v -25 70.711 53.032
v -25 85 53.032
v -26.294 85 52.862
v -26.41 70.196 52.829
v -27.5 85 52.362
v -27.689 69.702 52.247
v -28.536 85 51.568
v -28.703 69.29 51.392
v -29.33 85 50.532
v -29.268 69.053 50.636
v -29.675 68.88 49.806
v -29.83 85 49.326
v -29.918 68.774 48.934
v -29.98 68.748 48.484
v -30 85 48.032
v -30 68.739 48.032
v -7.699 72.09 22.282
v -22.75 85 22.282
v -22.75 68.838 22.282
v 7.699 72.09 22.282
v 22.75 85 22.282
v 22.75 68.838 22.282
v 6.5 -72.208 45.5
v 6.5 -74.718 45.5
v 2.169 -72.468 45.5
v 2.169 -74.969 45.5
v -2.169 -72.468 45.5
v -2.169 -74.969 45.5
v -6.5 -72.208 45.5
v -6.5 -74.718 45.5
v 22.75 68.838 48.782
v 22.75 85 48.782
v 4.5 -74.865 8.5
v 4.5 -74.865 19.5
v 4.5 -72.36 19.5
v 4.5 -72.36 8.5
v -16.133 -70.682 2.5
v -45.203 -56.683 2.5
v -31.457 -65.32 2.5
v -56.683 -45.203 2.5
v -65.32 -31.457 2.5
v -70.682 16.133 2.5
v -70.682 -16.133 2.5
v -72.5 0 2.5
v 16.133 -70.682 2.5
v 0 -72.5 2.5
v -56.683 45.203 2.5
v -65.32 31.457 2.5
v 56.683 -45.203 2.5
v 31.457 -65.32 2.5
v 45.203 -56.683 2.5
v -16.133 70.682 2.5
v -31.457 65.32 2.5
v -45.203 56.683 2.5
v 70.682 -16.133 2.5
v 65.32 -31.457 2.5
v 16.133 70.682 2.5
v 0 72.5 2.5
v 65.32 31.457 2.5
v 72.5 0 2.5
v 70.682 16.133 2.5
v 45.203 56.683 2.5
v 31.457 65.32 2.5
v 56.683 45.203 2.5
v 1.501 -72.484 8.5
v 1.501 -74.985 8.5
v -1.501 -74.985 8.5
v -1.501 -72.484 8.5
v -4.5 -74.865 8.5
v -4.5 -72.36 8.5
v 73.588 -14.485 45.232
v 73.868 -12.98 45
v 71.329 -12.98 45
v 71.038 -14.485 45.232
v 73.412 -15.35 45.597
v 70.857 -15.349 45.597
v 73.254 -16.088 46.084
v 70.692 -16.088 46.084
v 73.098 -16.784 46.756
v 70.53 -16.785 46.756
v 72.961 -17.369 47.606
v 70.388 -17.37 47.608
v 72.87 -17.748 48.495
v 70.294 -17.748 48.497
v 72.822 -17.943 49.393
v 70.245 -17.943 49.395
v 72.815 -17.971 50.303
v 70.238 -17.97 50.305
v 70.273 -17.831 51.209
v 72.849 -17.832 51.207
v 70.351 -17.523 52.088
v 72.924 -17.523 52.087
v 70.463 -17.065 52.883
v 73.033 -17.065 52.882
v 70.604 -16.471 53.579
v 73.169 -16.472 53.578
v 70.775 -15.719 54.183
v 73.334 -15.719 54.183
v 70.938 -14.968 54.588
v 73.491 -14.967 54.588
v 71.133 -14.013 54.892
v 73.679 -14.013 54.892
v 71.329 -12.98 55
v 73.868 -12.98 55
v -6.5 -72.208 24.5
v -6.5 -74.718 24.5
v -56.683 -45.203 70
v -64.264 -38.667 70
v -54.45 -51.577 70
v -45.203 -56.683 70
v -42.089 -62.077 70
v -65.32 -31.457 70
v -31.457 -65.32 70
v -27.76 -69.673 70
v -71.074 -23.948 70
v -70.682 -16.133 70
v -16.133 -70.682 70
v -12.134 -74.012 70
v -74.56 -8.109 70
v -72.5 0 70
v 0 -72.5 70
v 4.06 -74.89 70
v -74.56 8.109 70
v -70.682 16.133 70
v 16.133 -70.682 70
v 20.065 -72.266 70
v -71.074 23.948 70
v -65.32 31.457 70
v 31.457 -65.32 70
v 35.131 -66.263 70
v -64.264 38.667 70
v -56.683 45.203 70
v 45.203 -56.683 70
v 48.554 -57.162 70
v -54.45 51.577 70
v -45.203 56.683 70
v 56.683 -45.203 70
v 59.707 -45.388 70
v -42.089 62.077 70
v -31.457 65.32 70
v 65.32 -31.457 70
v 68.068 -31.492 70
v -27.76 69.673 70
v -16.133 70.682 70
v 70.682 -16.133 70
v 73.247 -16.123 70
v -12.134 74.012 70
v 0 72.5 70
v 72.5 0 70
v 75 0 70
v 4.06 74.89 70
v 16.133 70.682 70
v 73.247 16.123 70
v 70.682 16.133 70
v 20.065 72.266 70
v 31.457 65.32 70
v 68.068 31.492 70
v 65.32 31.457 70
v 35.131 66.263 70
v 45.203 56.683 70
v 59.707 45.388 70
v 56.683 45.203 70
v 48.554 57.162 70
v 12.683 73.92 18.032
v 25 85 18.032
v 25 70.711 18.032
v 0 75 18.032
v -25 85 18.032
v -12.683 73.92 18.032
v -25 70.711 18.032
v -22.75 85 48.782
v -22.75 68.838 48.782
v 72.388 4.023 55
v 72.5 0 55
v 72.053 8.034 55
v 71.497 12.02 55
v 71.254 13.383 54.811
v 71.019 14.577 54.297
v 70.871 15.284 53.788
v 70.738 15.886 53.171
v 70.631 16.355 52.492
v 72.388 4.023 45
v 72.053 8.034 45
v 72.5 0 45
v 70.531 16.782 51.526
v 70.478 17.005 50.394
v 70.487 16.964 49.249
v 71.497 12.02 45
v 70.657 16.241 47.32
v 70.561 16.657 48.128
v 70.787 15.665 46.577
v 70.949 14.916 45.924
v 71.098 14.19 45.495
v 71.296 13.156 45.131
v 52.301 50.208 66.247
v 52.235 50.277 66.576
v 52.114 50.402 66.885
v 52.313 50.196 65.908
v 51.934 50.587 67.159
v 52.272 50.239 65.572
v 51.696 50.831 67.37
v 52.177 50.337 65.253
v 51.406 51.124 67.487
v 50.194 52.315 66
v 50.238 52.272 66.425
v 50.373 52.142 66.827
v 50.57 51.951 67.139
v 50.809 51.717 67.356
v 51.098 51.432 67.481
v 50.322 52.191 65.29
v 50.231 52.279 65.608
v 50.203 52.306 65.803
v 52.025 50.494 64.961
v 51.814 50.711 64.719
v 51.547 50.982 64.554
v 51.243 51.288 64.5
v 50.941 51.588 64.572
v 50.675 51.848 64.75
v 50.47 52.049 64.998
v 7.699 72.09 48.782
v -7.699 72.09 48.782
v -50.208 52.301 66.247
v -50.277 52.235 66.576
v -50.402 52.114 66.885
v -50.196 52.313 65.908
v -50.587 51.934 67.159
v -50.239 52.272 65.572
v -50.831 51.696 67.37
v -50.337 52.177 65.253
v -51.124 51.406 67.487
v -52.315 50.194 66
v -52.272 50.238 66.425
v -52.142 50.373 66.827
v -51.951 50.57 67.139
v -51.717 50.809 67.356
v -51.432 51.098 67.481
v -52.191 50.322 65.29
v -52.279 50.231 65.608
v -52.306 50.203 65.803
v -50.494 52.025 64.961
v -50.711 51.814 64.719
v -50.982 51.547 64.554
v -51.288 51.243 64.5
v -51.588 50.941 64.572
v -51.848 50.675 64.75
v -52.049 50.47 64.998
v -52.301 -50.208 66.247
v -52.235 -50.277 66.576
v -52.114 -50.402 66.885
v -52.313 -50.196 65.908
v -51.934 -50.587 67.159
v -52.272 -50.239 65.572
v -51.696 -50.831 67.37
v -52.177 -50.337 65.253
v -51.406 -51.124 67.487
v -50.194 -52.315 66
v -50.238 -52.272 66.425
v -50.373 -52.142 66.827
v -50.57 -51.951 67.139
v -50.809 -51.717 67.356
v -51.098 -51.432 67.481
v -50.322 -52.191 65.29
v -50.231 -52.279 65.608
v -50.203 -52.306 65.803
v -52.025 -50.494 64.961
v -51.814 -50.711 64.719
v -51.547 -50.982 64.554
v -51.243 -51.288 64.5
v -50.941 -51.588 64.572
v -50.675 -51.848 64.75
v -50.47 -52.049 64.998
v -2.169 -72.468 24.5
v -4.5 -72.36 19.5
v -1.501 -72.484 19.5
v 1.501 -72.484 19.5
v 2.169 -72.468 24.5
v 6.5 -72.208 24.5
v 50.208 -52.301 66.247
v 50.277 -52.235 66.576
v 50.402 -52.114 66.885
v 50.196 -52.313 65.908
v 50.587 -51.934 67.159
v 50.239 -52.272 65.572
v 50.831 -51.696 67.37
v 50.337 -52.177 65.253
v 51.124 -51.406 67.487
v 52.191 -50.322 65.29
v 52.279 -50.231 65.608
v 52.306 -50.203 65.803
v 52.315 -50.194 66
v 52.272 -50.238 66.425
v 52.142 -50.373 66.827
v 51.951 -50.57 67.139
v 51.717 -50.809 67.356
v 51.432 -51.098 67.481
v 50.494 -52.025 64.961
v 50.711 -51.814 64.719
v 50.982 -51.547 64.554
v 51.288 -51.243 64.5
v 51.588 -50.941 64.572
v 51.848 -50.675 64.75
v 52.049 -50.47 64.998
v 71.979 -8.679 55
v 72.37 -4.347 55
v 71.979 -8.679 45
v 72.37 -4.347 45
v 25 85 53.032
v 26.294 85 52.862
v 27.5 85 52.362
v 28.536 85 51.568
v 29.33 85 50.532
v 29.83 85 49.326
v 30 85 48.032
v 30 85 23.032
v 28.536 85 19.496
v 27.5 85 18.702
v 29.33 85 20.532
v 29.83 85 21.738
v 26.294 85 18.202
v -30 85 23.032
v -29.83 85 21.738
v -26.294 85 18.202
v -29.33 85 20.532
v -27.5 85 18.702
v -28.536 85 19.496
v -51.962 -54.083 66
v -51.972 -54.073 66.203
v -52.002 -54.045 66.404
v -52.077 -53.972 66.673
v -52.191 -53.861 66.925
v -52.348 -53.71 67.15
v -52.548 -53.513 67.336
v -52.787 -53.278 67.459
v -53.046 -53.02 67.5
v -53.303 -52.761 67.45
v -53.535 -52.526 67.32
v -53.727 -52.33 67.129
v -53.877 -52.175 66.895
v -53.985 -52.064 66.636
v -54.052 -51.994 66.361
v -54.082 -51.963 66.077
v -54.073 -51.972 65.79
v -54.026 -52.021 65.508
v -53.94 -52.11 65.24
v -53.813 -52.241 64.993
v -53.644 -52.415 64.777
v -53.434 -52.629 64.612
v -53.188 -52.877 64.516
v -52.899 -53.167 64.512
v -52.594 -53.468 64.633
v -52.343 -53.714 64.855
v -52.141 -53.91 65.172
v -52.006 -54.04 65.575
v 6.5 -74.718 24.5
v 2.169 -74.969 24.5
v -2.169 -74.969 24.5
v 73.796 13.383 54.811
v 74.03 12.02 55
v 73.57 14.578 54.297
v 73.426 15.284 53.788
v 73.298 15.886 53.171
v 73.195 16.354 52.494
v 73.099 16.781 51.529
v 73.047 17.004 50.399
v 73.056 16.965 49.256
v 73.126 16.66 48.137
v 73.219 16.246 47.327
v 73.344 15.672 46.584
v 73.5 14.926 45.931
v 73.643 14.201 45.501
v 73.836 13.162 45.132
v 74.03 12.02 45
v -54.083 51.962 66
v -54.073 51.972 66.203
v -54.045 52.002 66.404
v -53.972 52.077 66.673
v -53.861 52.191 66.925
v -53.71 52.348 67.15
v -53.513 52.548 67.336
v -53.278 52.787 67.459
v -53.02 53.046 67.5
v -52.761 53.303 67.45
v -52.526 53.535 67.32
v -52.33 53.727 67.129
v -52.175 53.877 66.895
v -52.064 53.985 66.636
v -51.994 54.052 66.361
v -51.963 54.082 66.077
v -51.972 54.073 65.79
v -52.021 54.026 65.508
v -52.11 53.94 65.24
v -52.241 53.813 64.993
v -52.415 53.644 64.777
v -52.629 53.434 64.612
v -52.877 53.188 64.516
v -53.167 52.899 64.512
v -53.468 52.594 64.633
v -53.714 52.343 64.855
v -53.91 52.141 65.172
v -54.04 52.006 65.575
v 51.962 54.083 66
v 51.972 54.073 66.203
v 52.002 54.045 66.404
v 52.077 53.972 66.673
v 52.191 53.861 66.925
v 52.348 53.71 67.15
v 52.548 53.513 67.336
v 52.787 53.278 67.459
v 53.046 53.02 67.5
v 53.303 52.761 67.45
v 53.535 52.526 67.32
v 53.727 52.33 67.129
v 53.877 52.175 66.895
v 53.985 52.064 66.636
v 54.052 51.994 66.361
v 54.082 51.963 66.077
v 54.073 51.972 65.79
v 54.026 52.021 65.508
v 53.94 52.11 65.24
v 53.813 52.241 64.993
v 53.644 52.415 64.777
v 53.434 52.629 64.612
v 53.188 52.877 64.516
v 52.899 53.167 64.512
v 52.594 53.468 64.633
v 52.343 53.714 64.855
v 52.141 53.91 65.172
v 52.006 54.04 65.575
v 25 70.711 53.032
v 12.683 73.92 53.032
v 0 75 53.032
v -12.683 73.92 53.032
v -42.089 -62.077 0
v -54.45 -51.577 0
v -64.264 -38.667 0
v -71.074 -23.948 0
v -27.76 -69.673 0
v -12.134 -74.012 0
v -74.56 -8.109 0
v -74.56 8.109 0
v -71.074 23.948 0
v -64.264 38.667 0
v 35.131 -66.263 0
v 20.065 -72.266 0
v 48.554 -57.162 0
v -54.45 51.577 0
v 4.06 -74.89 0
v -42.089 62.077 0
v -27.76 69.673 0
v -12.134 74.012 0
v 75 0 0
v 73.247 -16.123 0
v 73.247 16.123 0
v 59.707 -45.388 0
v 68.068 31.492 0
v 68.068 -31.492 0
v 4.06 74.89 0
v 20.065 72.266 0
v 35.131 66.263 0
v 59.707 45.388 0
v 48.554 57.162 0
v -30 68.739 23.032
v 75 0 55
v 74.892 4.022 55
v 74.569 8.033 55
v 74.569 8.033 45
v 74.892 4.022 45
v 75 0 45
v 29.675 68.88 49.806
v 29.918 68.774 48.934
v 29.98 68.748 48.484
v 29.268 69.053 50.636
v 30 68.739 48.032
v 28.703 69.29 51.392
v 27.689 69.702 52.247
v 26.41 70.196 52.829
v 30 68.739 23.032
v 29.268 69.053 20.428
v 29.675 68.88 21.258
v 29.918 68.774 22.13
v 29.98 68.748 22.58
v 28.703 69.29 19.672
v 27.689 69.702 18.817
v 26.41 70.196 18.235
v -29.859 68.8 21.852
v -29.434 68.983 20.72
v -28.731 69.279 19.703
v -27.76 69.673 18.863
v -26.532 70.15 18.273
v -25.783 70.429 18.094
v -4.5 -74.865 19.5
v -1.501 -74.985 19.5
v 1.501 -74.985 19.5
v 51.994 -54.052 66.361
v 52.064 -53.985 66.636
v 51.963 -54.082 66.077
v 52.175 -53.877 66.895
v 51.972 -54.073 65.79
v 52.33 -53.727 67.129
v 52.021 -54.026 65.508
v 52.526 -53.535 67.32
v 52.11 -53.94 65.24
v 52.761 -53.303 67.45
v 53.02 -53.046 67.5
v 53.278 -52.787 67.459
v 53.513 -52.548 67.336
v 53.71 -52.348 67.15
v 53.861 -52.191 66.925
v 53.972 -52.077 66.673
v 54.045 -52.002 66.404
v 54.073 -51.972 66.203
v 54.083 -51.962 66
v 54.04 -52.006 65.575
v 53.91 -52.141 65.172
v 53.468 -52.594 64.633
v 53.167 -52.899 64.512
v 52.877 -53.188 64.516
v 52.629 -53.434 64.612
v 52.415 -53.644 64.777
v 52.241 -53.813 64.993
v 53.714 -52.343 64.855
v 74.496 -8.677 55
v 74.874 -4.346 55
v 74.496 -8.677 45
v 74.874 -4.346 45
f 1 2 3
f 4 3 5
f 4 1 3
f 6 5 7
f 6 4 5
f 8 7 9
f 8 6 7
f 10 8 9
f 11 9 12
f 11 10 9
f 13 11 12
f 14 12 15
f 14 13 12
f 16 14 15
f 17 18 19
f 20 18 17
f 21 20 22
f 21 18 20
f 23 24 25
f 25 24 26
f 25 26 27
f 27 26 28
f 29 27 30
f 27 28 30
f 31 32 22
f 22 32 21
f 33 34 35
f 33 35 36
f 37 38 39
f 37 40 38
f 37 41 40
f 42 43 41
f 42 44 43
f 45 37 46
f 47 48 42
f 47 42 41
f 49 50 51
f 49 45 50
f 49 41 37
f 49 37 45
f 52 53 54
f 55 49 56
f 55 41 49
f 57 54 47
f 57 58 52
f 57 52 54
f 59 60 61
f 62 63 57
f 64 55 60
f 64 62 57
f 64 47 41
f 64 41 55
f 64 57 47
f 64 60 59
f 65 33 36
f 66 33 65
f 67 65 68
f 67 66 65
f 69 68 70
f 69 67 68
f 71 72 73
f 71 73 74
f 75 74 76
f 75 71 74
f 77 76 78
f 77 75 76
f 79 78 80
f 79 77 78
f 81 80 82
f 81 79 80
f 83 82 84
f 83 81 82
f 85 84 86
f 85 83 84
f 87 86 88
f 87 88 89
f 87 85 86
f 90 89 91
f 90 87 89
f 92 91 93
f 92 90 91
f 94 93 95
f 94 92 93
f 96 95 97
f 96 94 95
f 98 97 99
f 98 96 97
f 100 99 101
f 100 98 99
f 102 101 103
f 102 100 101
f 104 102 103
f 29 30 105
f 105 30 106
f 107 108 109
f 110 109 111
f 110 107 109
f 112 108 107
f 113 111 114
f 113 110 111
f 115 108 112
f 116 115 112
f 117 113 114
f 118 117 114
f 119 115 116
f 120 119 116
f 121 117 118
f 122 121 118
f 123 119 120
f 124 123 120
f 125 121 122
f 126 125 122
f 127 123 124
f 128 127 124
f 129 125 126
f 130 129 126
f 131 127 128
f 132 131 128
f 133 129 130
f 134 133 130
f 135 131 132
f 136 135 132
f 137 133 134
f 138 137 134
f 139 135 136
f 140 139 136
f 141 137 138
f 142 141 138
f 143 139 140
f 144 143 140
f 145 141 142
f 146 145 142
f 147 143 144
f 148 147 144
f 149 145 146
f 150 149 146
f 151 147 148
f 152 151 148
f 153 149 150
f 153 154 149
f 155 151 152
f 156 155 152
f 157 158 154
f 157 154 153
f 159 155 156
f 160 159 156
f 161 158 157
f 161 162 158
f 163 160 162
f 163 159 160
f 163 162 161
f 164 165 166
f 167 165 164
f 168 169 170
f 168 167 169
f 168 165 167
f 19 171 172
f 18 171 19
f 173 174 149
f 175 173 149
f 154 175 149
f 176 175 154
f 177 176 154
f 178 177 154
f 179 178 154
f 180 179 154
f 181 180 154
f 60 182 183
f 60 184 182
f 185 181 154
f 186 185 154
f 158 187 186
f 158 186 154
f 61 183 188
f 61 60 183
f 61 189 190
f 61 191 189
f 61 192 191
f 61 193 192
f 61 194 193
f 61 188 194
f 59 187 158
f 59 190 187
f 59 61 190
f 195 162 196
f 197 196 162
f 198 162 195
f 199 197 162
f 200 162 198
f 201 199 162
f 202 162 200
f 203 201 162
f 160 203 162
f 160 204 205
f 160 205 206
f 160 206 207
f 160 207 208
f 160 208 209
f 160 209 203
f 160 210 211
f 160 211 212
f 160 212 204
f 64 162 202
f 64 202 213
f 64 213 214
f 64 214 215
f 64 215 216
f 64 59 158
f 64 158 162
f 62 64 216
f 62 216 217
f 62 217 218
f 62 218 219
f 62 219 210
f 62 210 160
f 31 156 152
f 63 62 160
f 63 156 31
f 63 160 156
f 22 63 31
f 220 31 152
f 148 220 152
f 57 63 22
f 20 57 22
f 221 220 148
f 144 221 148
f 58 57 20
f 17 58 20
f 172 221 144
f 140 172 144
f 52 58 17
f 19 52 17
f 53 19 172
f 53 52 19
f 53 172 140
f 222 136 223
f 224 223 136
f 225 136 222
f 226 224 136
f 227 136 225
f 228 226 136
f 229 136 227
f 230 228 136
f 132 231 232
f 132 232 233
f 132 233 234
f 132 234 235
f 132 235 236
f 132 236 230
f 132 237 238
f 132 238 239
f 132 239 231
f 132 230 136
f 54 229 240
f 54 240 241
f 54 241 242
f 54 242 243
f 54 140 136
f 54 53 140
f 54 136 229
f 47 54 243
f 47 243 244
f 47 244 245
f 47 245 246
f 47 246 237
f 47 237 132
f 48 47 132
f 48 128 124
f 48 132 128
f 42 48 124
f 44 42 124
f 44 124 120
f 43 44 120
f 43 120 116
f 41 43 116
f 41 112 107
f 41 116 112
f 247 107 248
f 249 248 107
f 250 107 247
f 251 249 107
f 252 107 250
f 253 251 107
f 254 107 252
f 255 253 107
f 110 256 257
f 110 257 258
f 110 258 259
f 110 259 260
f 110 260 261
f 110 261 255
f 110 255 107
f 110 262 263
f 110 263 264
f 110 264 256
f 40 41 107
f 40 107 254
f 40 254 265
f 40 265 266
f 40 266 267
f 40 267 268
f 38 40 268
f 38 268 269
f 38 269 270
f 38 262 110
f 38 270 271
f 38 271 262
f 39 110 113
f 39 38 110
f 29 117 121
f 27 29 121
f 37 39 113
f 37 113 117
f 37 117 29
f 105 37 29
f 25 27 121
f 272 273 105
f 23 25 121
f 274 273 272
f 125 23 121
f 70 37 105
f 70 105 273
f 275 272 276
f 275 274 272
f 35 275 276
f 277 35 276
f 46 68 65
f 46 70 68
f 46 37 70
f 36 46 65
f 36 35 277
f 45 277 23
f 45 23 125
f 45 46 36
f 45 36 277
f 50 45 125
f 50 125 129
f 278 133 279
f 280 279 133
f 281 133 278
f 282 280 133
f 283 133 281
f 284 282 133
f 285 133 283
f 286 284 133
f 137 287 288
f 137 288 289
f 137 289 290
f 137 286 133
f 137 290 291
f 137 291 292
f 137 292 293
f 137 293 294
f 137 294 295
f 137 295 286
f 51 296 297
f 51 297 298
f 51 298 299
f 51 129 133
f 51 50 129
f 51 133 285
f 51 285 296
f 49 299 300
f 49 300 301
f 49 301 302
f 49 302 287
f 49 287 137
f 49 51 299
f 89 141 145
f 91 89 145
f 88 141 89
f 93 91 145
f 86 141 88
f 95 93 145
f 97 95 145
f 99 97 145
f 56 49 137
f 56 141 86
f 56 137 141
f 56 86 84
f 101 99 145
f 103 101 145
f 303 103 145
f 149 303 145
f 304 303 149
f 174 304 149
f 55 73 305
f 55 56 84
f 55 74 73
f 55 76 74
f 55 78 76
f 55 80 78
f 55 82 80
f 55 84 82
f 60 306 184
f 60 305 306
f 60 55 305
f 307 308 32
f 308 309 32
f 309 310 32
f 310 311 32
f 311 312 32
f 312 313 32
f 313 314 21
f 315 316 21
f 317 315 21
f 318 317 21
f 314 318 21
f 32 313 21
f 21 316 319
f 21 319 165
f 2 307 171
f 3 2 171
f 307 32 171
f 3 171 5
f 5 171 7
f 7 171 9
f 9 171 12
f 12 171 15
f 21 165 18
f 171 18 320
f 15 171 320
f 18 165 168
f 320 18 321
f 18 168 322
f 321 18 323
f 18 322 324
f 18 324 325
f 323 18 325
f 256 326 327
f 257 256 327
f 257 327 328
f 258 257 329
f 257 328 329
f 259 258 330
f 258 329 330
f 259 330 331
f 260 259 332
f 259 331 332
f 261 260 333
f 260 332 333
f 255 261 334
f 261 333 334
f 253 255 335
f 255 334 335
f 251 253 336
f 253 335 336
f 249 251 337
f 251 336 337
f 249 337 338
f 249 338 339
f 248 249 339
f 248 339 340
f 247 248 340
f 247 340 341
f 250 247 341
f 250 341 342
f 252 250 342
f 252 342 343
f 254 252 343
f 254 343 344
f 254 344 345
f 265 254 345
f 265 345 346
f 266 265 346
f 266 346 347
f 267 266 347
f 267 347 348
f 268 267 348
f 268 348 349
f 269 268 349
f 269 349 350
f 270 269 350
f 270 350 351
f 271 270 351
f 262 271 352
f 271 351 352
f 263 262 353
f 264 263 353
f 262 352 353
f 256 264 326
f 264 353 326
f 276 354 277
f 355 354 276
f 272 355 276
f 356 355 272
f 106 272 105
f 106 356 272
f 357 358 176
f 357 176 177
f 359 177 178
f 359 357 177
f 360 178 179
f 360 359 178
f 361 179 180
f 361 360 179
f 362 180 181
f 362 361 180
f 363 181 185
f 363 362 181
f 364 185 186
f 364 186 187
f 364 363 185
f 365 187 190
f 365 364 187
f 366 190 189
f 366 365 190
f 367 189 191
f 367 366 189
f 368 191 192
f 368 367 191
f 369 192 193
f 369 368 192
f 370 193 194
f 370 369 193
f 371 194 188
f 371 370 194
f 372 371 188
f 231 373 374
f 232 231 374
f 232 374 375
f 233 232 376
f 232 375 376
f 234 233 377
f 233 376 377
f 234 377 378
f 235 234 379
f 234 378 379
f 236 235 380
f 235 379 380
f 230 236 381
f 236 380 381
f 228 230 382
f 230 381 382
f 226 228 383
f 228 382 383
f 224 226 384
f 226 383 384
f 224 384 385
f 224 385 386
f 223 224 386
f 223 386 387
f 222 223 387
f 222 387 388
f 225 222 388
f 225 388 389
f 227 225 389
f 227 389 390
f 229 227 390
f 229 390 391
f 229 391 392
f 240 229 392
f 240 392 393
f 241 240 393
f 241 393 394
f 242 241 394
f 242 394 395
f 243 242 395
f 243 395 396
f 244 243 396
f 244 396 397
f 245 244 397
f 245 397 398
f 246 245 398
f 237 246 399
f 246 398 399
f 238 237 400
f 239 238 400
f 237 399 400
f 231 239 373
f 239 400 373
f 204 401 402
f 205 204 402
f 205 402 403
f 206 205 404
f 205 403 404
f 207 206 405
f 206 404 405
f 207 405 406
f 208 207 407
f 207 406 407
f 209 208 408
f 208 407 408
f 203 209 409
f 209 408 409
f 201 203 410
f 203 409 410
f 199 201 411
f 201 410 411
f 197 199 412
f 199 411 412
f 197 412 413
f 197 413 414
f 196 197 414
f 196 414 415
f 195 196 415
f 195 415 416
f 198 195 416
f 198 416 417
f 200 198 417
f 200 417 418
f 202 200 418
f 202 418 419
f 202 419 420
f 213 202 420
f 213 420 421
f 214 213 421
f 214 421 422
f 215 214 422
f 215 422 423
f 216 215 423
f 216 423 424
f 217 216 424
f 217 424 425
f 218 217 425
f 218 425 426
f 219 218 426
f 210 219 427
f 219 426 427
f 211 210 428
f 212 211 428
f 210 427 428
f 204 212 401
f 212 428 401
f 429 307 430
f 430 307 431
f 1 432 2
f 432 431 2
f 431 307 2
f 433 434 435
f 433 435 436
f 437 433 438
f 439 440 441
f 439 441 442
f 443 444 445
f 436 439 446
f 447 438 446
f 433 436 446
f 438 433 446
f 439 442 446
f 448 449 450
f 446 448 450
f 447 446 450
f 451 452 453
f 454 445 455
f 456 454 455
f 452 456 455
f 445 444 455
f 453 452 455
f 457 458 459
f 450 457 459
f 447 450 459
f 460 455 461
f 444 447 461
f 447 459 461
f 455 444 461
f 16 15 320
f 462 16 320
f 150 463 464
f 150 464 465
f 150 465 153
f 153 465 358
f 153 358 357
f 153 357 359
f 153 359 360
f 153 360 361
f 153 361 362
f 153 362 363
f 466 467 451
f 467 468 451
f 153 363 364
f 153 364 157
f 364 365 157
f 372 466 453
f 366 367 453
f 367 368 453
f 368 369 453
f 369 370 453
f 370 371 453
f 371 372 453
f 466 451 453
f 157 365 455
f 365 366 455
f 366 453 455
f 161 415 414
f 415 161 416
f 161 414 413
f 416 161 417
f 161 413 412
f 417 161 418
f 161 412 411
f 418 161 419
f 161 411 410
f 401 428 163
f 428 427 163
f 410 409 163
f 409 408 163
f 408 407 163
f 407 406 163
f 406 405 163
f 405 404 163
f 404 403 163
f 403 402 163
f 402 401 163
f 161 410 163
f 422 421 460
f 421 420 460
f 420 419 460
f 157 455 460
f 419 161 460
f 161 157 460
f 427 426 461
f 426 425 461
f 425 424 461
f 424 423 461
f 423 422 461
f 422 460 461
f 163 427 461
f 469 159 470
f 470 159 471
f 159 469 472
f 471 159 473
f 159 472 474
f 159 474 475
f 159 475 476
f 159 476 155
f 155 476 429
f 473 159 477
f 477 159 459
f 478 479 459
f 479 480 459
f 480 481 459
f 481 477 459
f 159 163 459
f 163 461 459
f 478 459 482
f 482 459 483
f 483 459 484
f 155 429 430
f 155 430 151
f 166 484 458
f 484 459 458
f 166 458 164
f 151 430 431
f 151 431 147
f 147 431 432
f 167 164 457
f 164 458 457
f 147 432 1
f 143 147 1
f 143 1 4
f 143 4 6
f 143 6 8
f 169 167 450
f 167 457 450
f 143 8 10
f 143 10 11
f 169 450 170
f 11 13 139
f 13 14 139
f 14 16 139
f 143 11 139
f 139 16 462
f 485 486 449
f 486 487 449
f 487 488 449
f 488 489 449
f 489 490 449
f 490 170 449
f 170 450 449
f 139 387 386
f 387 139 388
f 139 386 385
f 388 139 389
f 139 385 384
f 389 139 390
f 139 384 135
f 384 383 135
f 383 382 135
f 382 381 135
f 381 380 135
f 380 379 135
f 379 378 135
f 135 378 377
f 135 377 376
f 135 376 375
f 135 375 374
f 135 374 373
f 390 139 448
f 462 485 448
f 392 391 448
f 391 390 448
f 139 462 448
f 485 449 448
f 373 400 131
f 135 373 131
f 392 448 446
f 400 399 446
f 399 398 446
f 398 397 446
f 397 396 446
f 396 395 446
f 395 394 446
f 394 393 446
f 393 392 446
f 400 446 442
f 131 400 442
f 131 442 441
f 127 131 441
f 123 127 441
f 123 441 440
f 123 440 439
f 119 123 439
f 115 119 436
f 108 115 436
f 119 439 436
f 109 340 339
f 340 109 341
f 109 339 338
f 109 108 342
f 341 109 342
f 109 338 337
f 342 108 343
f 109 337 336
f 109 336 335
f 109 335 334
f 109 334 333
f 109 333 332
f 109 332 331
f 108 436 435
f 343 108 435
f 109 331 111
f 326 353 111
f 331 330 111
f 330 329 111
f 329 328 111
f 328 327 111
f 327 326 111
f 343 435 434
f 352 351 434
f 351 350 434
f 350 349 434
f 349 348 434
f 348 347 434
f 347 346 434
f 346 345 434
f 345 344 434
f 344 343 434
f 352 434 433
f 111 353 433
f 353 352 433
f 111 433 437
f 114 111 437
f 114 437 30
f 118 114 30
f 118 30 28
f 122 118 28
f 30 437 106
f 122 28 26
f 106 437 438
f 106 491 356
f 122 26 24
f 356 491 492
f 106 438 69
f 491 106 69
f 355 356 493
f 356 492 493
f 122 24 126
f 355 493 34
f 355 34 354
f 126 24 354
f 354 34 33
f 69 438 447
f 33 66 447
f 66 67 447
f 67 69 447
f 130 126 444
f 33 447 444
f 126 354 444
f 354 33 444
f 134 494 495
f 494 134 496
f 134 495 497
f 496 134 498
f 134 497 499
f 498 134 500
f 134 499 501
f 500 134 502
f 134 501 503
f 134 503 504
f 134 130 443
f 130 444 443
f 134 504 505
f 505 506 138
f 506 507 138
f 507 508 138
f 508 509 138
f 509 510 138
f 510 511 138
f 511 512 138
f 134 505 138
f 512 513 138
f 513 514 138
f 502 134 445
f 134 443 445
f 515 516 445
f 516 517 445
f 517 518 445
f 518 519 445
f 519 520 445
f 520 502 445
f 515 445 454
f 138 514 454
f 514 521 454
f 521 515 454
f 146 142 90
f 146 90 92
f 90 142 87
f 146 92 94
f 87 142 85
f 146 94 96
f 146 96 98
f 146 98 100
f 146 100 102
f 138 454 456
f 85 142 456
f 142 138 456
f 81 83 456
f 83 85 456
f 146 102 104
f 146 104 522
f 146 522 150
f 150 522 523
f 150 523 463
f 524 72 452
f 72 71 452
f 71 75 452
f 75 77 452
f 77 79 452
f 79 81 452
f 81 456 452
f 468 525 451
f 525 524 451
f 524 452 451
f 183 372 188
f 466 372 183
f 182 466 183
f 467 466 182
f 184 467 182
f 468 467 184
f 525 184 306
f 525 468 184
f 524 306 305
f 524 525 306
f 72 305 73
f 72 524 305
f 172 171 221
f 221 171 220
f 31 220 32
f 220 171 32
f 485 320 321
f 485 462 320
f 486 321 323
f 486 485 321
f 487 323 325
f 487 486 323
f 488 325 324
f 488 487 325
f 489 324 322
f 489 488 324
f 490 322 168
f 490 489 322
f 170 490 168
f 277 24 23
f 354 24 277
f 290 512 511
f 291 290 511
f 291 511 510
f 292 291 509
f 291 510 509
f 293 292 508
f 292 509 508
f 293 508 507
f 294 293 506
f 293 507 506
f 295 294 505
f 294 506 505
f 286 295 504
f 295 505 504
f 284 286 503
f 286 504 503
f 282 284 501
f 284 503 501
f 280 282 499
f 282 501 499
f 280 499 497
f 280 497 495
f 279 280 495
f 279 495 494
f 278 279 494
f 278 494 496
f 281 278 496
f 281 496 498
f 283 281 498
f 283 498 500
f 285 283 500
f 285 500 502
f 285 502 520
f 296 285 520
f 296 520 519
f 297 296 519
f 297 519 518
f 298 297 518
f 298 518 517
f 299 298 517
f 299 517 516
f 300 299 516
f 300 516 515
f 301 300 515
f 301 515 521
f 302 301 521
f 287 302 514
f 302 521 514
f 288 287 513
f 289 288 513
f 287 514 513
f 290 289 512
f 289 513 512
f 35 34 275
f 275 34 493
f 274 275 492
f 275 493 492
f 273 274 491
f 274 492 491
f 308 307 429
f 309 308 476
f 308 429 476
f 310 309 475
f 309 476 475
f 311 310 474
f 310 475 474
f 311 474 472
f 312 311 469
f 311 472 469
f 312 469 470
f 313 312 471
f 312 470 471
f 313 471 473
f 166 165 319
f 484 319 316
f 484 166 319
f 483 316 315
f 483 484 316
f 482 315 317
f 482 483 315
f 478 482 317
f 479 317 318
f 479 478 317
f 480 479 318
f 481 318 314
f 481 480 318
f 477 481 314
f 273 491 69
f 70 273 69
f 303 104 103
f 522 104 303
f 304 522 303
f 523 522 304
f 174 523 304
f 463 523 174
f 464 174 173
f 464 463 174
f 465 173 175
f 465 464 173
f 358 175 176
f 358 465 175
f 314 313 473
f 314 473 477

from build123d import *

# Parameters (mm, degrees)
SZKIC1_R                         = 75
DODANIE_WYCI_GNI_CIE1_DEPTH      = 70
SKORUPA1_T                       = -2.5
SZKIC3_W                         = 13
SZKIC3_H                         = 21
WYTNIJ_WYCI_GNI_CIE1_DEPTH       = 60
SZKIC4_W                         = 9
SZKIC4_H                         = 11
WYTNIJ_WYCI_GNI_CIE2_DEPTH       = 60
DODANIE_WYCI_GNI_CIE2_REACH      = 192.066
DODANIE_WYCI_GNI_CIE2_END_RADIUS = 75
SZKIC7_W                         = 60
SZKIC7_H                         = 35
SZKIC8_W                         = 45.5
SZKIC8_H                         = 26.5
WYTNIJ_WYCI_GNI_CIE4_DEPTH       = 30
ZAOKR_GLENIE1_R                  = 5
WYTNIJ_WYCI_GNI_CIE5_DEPTH       = 14
SZKIC10_R                        = 1.5
WYTNIJ_WYCI_GNI_CIE6_DEPTH       = 10
SZYK_KO_OWY1_COUNT               = 4


with BuildPart() as part:
    # Szkic1 → Dodanie-wyci_gni_cie1 (new body)
    with BuildSketch(Plane.XY):
        Circle(SZKIC1_R)
    extrude(amount=DODANIE_WYCI_GNI_CIE1_DEPTH)

    # Skorupa1
    skorupa1_openings = [part.faces().sort_by_distance(p)[0] for p in [
        (0, 0, 70),
    ]]
    offset(amount=SKORUPA1_T, openings=skorupa1_openings, kind=Kind.INTERSECTION)

    # Szkic3 → Wytnij-wyci_gni_cie1 (cut)
    with BuildSketch(Plane(origin=(0, -75, 0), x_dir=(-1, 0, 0), z_dir=(0, -1, 0))):
        with Locations((0, -35)):
            Rectangle(SZKIC3_W, SZKIC3_H)
    extrude(amount=-WYTNIJ_WYCI_GNI_CIE1_DEPTH, mode=Mode.SUBTRACT)

    # Szkic4 → Wytnij-wyci_gni_cie2 (cut)
    with BuildSketch(Plane(origin=(0, -75, 0), x_dir=(-1, 0, 0), z_dir=(0, -1, 0))):
        with Locations((0, -14)):
            Rectangle(SZKIC4_W, SZKIC4_H)
    extrude(amount=-WYTNIJ_WYCI_GNI_CIE2_DEPTH, mode=Mode.SUBTRACT)

    # Dodanie-wyci_gni_cie2: up to this cylinder (the profile starts outside it)
    dodanie_wyci_gni_cie2_end = Plane(origin=(0, 0, 35.532003), z_dir=(0, 0, -1)) * Cylinder(DODANIE_WYCI_GNI_CIE2_END_RADIUS, 535.132, mode=Mode.PRIVATE)
    # Szkic7 → Dodanie-wyci_gni_cie2 (add, up to the surface)
    with BuildSketch(Plane(origin=(0, 85, 0), x_dir=(-1, 0, 0), z_dir=(0, -1, 0)), mode=Mode.PRIVATE) as dodanie_wyci_gni_cie2_sk1:
        with Locations((0, -35.532003496)):
            Rectangle(SZKIC7_W, SZKIC7_H)
    dodanie_wyci_gni_cie2_tool1 = extrude(dodanie_wyci_gni_cie2_sk1.sketch, amount=DODANIE_WYCI_GNI_CIE2_REACH, mode=Mode.PRIVATE) - dodanie_wyci_gni_cie2_end
    add(dodanie_wyci_gni_cie2_tool1.solids().sort_by_distance((0, 85, 35.532003))[0])

    # Szkic8 → Wytnij-wyci_gni_cie4 (cut)
    with BuildSketch(Plane(origin=(0, 85, 0), x_dir=(1, 0, 0), z_dir=(0, 1, 0))):
        with Locations((0, -35.532003496)):
            Rectangle(SZKIC8_W, SZKIC8_H)
    extrude(amount=-WYTNIJ_WYCI_GNI_CIE4_DEPTH, mode=Mode.SUBTRACT)

    # Zaokr_glenie1
    zaokr_glenie1_edges = [part.edges().sort_by_distance(p)[0] for p in [
        (-30, 76.869317712, 18.032003496),
        (-30, 76.869317712, 53.032003496),
        (30, 76.869317712, 18.032003496),
        (30, 76.869317712, 53.032003496),
    ]]
    fillet(zaokr_glenie1_edges, radius=ZAOKR_GLENIE1_R)

    # Szkic9 → Wytnij-wyci_gni_cie5 (cut)
    with BuildSketch(Plane(origin=(75, 0, 0), x_dir=(0, 0, -1), z_dir=(1, 0, 0))):
        with BuildLine():
            Line((-55, -12.979686846), (-55, 12.020313154))
            ThreePointArc((-55, 12.020313154), (-50, 17.020313154), (-45, 12.020313154))
            Line((-45, 12.020313154), (-45, -12.979686846))
            ThreePointArc((-45, -12.979686846), (-50, -17.979686846), (-55, -12.979686846))
        make_face()
    extrude(amount=-WYTNIJ_WYCI_GNI_CIE5_DEPTH, mode=Mode.SUBTRACT)

    # Szkic10 → Wytnij-wyci_gni_cie6 (cut)
    with BuildSketch(Plane(origin=(53.033008589, 53.033008589, 0), x_dir=(0, 0, -1), z_dir=(0.7071067811865512, 0.7071067811865438, 0))):
        with Locations(Location((-66, 0, 0), (0, 0, 90))):
            Circle(SZKIC10_R)
    wytnij_wyci_gni_cie6 = extrude(amount=-WYTNIJ_WYCI_GNI_CIE6_DEPTH, mode=Mode.SUBTRACT)

    # Szyk ko_owy1: Wytnij-wyci_gni_cie6 ×4 about axis
    szyk_ko_owy1_axis = Axis((0, 0, 70), (0, 0, -1))
    for i in range(1, SZYK_KO_OWY1_COUNT):
        add(wytnij_wyci_gni_cie6.rotate(szyk_ko_owy1_axis, i * 360 / SZYK_KO_OWY1_COUNT), mode=Mode.SUBTRACT)


solid = part.part
